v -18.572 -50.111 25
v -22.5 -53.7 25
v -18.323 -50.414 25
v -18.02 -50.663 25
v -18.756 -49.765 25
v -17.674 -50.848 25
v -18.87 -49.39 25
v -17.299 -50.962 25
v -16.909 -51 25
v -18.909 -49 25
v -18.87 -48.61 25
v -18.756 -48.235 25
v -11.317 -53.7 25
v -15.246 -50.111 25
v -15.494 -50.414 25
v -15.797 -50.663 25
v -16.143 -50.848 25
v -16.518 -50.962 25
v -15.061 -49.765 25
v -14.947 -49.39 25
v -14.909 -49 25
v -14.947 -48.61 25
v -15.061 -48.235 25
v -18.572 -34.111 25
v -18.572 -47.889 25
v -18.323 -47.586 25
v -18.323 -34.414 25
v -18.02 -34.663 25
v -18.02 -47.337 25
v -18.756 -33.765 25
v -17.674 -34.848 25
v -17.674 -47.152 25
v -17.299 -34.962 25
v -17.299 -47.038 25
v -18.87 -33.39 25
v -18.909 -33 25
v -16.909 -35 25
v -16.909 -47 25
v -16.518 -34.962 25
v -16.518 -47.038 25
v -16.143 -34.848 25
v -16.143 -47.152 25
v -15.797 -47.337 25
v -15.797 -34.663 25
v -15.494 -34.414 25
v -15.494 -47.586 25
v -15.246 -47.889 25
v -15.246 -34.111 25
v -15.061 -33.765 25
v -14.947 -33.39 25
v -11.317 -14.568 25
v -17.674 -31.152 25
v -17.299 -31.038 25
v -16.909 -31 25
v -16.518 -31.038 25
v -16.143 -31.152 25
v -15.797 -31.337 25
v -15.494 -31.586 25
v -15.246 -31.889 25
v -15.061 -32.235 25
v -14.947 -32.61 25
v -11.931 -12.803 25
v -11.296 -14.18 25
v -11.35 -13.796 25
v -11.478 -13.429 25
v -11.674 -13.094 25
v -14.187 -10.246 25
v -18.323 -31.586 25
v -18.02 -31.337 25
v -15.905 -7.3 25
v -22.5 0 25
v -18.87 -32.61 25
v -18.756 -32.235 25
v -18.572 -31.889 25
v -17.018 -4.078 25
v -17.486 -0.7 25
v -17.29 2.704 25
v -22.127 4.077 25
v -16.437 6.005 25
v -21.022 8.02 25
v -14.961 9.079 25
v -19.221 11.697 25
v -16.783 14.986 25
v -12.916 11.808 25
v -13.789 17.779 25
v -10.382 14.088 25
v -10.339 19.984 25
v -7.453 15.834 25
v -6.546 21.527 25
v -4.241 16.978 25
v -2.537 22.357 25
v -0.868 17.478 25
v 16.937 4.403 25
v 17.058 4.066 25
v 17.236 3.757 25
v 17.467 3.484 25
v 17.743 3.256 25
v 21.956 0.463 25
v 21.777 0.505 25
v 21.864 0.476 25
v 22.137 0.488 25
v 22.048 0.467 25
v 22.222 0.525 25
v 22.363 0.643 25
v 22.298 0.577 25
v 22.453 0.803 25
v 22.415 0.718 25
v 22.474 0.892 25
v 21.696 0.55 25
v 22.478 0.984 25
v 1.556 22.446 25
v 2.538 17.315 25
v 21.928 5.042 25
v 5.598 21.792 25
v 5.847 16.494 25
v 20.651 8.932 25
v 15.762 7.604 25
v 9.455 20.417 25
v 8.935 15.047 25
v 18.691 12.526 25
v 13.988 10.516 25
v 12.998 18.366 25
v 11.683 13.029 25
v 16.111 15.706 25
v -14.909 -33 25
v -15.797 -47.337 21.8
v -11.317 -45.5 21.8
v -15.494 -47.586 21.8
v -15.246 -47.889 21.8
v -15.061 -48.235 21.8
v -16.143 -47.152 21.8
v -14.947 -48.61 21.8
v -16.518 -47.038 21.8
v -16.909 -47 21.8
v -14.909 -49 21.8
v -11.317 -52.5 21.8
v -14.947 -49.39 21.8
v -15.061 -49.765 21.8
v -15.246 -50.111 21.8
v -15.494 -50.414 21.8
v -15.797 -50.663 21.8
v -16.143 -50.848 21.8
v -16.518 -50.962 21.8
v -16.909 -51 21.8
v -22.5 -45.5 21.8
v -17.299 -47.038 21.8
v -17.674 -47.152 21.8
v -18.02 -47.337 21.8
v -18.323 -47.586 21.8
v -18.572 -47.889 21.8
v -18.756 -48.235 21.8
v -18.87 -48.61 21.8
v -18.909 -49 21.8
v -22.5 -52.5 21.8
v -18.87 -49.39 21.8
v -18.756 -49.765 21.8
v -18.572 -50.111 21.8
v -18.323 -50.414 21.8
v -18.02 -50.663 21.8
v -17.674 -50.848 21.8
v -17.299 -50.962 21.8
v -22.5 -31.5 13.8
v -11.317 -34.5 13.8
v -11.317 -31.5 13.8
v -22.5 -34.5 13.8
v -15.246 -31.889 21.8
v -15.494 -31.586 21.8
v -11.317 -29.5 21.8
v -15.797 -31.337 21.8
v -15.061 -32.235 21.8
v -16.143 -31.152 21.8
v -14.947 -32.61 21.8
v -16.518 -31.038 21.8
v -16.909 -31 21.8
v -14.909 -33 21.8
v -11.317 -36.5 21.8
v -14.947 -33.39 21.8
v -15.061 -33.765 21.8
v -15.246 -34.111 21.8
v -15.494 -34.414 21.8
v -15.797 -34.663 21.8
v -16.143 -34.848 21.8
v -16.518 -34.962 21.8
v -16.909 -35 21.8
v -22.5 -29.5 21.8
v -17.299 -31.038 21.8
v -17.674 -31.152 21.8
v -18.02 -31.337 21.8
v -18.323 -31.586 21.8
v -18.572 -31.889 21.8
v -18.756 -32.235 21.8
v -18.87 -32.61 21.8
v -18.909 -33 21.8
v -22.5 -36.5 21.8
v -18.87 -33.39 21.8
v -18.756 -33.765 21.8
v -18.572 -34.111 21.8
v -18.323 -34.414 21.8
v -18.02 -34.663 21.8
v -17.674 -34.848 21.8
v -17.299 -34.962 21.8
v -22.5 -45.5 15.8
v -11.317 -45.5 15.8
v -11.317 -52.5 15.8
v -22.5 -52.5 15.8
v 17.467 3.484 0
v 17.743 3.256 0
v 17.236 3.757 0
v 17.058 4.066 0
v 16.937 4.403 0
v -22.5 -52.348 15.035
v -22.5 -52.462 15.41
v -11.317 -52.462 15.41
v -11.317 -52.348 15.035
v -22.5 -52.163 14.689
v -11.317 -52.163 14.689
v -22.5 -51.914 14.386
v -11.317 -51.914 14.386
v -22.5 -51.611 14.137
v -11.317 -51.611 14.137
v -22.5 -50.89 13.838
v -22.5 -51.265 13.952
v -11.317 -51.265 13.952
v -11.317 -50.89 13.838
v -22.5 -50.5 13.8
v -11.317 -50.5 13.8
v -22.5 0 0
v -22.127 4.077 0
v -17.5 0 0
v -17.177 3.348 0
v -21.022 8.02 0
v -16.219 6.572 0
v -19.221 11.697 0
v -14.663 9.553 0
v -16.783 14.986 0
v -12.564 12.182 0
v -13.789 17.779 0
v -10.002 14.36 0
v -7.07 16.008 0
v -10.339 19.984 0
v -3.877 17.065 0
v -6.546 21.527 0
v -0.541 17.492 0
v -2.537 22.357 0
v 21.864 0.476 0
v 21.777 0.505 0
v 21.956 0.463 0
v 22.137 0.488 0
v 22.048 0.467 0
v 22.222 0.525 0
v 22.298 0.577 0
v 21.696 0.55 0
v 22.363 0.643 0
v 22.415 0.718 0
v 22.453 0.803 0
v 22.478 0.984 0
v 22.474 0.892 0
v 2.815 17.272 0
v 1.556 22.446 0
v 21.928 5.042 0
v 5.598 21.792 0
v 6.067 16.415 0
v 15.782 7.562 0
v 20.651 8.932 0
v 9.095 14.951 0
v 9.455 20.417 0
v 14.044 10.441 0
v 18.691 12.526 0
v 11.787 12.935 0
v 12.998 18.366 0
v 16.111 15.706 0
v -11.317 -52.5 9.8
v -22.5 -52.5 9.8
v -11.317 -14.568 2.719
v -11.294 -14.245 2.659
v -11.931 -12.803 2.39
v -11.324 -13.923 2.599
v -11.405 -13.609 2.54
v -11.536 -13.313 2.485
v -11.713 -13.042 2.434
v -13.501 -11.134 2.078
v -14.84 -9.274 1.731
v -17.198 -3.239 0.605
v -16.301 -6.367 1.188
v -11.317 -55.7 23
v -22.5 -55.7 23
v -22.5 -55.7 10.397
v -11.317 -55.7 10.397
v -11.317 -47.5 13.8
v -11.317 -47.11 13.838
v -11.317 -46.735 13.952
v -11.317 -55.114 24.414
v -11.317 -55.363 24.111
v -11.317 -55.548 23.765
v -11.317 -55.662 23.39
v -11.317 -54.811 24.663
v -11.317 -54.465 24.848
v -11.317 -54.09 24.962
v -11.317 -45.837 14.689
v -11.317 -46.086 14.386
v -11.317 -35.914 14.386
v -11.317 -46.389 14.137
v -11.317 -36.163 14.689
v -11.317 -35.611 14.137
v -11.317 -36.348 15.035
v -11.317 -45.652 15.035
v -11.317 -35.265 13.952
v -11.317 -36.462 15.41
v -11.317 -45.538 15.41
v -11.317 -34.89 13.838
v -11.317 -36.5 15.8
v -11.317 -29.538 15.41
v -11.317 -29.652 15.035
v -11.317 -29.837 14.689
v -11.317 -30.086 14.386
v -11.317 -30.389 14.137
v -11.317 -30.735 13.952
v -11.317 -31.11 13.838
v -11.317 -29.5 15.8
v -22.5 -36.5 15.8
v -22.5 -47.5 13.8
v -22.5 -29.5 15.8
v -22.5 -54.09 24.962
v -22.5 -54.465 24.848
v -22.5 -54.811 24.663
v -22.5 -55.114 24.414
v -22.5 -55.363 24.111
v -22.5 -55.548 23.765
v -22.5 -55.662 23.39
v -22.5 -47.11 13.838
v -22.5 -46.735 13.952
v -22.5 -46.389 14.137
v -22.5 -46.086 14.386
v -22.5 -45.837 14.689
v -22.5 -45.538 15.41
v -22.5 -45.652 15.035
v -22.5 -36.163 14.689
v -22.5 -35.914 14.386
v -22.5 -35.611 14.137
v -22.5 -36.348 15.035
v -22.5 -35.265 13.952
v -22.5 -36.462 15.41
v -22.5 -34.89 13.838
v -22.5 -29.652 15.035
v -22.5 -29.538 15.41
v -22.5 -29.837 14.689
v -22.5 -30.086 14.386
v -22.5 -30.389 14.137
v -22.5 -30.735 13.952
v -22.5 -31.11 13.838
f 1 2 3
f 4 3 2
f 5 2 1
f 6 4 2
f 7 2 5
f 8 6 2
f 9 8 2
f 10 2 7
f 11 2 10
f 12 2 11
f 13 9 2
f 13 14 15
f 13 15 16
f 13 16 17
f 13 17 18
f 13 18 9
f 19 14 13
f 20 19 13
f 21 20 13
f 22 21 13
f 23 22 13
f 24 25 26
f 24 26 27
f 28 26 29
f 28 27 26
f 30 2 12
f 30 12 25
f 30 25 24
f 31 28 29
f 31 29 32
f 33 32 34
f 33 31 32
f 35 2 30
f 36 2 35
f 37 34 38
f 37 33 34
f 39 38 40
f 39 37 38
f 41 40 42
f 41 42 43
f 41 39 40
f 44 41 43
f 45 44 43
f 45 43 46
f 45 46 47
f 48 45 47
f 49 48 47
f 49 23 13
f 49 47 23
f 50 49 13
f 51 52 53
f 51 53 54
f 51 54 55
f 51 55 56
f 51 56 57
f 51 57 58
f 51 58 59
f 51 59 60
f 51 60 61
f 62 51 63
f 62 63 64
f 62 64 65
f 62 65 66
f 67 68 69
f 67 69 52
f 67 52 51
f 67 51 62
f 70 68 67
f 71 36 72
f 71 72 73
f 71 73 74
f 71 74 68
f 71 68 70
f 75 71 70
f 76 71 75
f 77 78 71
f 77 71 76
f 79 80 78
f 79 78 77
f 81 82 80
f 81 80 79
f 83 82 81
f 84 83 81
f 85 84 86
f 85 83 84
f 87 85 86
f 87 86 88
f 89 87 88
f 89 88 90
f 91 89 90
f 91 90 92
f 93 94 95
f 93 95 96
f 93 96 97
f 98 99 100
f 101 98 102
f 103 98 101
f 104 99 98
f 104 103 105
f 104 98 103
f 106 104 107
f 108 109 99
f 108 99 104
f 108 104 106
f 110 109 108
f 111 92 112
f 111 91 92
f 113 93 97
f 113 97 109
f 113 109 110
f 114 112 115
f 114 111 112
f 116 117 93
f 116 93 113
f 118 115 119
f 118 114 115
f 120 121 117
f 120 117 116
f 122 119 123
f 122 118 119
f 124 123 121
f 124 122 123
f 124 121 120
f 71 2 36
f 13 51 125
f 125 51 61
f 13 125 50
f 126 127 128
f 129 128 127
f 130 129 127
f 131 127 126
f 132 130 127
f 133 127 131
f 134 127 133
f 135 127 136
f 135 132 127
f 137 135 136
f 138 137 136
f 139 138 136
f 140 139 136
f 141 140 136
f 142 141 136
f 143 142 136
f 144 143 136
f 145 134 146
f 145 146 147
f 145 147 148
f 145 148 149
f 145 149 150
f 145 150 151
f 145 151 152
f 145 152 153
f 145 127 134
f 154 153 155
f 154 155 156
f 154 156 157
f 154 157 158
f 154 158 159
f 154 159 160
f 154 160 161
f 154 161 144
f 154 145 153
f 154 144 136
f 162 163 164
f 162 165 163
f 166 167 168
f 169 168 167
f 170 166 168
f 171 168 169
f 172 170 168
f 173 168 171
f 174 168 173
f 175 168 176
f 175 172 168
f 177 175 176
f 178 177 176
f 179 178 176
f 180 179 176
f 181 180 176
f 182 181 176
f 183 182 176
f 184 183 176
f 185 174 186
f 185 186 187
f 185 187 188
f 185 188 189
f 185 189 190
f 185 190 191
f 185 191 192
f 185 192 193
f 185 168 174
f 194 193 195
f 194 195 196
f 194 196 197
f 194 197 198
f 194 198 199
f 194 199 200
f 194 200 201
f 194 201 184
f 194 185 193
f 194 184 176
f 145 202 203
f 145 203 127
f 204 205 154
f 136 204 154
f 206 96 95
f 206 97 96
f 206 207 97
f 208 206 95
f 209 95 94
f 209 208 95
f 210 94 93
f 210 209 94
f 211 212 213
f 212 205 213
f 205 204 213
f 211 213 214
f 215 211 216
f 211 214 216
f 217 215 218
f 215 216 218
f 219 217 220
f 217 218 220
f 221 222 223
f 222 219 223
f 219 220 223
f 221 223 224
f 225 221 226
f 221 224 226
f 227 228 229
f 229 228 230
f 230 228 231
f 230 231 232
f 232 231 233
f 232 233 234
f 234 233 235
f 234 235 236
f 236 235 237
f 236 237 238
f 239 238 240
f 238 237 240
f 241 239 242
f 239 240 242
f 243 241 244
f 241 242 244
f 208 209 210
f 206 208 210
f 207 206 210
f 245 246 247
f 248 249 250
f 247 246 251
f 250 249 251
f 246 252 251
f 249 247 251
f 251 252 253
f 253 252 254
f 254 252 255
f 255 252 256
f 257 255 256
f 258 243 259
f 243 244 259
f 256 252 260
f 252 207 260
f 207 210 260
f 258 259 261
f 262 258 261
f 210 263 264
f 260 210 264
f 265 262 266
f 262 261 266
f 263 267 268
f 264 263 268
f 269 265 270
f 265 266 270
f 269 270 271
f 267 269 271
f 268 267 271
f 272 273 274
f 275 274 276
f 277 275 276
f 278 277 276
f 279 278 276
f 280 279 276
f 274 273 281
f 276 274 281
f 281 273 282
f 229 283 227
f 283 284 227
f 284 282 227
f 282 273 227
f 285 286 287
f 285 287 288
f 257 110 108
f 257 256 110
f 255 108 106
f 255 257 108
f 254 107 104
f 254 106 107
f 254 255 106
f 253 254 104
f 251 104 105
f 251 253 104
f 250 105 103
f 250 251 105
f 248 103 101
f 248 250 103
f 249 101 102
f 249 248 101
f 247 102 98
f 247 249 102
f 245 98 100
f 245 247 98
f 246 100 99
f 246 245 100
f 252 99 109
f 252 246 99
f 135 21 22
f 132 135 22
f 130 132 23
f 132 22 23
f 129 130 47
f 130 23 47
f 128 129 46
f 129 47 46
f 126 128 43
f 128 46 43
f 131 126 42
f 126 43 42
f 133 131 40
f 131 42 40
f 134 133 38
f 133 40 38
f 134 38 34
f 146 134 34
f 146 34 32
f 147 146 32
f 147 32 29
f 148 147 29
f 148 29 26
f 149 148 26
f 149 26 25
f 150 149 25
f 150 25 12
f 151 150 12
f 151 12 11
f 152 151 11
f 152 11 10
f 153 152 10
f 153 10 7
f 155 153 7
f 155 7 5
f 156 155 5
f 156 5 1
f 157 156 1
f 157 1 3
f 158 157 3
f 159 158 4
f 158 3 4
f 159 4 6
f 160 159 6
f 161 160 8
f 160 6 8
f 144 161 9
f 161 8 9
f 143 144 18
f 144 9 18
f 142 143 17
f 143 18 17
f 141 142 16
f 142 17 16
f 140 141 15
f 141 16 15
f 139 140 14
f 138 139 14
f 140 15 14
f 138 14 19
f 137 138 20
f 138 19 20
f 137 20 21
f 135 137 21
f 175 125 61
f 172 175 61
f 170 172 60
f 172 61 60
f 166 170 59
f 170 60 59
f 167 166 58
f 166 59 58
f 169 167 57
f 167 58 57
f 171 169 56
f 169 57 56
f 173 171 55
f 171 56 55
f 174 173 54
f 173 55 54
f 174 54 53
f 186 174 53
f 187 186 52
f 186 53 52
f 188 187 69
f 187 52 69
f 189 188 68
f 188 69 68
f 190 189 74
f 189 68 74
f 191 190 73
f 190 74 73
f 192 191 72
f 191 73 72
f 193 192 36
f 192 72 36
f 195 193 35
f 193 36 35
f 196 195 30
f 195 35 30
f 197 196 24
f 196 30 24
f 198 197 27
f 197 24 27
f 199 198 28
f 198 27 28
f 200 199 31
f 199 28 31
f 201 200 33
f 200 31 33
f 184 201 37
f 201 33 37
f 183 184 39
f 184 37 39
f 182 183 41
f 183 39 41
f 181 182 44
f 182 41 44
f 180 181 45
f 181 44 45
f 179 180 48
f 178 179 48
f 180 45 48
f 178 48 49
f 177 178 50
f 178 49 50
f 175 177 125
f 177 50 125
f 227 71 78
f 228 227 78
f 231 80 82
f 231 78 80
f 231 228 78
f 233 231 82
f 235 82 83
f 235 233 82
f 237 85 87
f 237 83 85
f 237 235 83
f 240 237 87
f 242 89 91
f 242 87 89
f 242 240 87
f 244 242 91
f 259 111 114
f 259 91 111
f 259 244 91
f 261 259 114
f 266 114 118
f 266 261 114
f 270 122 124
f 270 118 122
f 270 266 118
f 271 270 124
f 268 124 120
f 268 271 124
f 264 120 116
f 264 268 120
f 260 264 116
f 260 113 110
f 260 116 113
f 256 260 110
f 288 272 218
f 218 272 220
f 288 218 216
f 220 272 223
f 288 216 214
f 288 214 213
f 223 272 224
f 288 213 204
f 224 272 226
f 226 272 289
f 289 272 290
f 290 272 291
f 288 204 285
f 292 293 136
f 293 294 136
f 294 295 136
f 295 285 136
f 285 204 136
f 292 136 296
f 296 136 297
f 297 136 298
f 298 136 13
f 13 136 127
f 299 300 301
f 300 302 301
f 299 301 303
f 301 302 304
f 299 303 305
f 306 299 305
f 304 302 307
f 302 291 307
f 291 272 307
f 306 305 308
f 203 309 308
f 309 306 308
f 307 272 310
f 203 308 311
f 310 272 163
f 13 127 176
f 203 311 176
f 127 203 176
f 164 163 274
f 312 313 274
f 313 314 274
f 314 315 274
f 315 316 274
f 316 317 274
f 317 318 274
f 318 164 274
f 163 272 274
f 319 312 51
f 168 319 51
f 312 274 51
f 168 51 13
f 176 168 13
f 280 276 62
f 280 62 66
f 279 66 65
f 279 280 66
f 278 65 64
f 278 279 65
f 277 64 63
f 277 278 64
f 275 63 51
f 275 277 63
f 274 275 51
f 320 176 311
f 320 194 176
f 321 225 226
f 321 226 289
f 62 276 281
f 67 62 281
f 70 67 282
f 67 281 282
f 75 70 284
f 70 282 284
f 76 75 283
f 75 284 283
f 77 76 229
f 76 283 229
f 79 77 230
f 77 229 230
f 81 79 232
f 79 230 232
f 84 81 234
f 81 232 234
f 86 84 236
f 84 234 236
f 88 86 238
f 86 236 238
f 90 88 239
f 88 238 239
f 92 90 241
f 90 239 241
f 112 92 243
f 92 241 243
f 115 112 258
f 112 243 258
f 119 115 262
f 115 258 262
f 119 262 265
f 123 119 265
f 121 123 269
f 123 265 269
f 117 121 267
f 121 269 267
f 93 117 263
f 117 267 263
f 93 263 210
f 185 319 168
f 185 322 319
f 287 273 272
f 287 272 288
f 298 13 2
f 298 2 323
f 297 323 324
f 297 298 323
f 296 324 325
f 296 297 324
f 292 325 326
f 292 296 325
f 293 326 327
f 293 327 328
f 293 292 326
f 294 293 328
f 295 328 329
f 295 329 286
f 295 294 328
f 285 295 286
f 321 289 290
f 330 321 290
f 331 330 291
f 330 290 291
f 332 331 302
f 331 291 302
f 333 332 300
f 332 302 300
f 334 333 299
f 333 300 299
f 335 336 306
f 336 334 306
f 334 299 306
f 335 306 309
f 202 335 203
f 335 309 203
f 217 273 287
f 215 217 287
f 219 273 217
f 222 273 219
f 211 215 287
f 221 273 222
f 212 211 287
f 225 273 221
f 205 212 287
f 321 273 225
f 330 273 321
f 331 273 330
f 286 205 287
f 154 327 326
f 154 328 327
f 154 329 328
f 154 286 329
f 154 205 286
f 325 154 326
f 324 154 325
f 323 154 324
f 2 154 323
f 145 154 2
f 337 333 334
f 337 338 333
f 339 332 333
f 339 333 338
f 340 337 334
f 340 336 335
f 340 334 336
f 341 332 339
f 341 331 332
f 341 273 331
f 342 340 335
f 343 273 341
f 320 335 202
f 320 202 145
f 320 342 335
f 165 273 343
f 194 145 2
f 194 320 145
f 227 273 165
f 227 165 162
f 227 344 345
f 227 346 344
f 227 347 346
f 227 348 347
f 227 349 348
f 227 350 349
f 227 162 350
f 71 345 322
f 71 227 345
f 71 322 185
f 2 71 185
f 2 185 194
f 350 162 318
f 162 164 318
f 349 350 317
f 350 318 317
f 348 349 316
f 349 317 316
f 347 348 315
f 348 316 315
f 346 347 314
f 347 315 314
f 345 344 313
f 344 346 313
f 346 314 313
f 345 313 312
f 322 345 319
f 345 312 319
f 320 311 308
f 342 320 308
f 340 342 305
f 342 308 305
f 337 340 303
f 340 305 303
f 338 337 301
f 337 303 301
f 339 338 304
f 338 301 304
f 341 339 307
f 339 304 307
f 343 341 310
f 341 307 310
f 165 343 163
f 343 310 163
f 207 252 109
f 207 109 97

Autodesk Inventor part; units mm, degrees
ref_plane "YZ Plane" through (0, 0, 0) normal (1, 0, 0) x (0, 1, 0)
ref_plane "XZ Plane" through (0, 0, 0) normal (0, 1, 0) x (-1, 0, 0)
ref_plane "XY Plane" through (0, 0, 0) normal (0, 0, 1) x (1, 0, 0)
sketch "Эскиз1" plane through (0, 0, 0) normal (0, 0, 1) x (1, 0, 0)
  arc A0 (16.937, 4.4032) -> (-11.9308, -12.8026) centre (0, 0) ccw
  arc A1 (22.4785, 0.9844) -> (-22.5, 0) centre (0, 0) ccw
  line L0 (-22.5, 0) -> (-22.5, -55)
  line L1 (-22.5, 0) -> (32.5, 0) construction
  line L2 (-22.5, -55) -> (-17.5, -55)
  line L3 (21.6965, 0.5499) -> (17.743, 3.256)
  arc A2 (-11.3173, -14.5681) -> (-11.9308, -12.8026) centre (-13.2943, -14.2658) ccw
  arc A3 (16.937, 4.4032) -> (17.743, 3.256) centre (18.8727, 4.9064) ccw
  arc A4 (21.6965, 0.5499) -> (22.4785, 0.9844) centre (21.9789, 0.9626) ccw
  line L4 (-11.3173, -14.5681) -> (-11.3173, -55)
  line L5 (-11.3173, -55) -> (-17.5, -55)
  point P0 (22.5, 0)
  point P1 (-11.1519, -13.4865)
  point P2 (17.1061, 3.6919)
  dimension "d0" = 35
  dimension "d1" = 45
  dimension "d2" = 55
  dimension "d3" = 90
  dimension "d4" = 5
  dimension "d5" = 2
  dimension "d6" = 0.5
extrude "Выдавливание1" add sketch "Эскиз1" along normal blind 25
sketch "Эскиз2" plane through (0, 0, 25) normal (0, 0, 1) x (1, 0, 0)
  line L0 (-22.5, -55) -> (-11.3173, -55) projected
  line L1 (-16.9086, -55) -> (-16.9086, -49)
  circle A0 centre (-16.9086, -49) radius 2
  line L2 (-16.9086, -49) -> (-16.9086, -33)
  circle A1 centre (-16.9086, -33) radius 2
  point P0 (0, 0)
  dimension "d9" = 6
  dimension "d10" = 4
  dimension "d11" = 16
  dimension "d12" = 4
extrude "Выдавливание2" cut sketch "Эскиз2" against normal blind 10
sketch "Эскиз3" plane through (-22.5, -55, 0) normal (-1, 0, 0) x (0, 0, 1)
  line L0 (25, 24) -> (25, 20) projected
  line L1 (25, 8) -> (25, 4) projected
  line L2 (25, 20) -> (25, 18.5)
  line L3 (25, 8) -> (25, 11)
  line L4 (0, 55) -> (0, 0) projected
  line L5 (25, 18.5) -> (0, 18.5)
  line L6 (0, 18.5) -> (0, 9.5)
  line L7 (0, 9.5) -> (25, 9.5)
  line L8 (25, 9.5) -> (25, 18.5)
  line L9 (21.8, 18.5) -> (21.8, 9.5)
  line L10 (21.8, 18.5) -> (13.8, 18.5)
  line L11 (13.8, 18.5) -> (13.8, 9.5)
  line L12 (21.8, 9.5) -> (13.8, 9.5)
  line L13 (25, 24) -> (25, 25.5)
  line L14 (21.8, 18.5) -> (13.8, 18.5)
  line L15 (25, 24) -> (25, 4)
  line L16 (25, 14) -> (-3.5354, 14)
  line L17 (21.8, 9.5) -> (13.8, 9.5)
  line L18 (25, 4) -> (25, 2.5)
  line L19 (25, 20) -> (15, 20) projected
  line L20 (21.8, 20) -> (13.8, 20)
  line L21 (13.8, 20) -> (13.8, 25.5)
  line L22 (13.8, 25.5) -> (21.8, 25.5)
  line L23 (21.8, 25.5) -> (21.8, 20)
  line L24 (21.8, 8) -> (13.8, 8)
  line L25 (13.8, 8) -> (13.8, 2.5)
  line L26 (13.8, 2.5) -> (21.8, 2.5)
  line L27 (21.8, 2.5) -> (21.8, 8)
  line L28 (21.8, 18.5) -> (13.8, 18.5)
  line L29 (13.8, 18.5) -> (13.8, 20)
  line L30 (13.8, 20) -> (21.8, 20)
  line L31 (21.8, 20) -> (21.8, 18.5)
  line L32 (21.8, 8) -> (13.8, 8)
  line L33 (13.8, 8) -> (13.8, 9.5)
  line L34 (13.8, 9.5) -> (21.8, 9.5)
  line L35 (21.8, 9.5) -> (21.8, 8)
  point P0 (15, 8)
  point P1 (21.8, 9.5)
  point P2 (13.8, 9.5)
  dimension "d15" = 1.5
  dimension "d16" = 3
  dimension "d18" = 8
  dimension "d21" = 1.5
extrude "Выдавливание3" cut sketch "Эскиз3" against normal through all contours L31 L5 L29 L20 L19 | L19 L20 L21 L22 L23 | L35 L24 L33 L7 | L27 L26 L25 L24
sketch "Эскиз4" plane through (-22.5, -55, 0) normal (0, -1, 0) x (1, 0, 0)
  line L0 (0, 0) -> (11.1827, 0) projected
  line L1 (11.1827, 0) -> (11.1827, 25) projected
  line L2 (0, 25) -> (11.1827, 25) projected
  line L3 (0, 0) -> (0, 25) projected
  point P0 (22.5, 0)
extrude "Выдавливание4" add sketch "Эскиз4" along normal blind 0.7
sketch "Эскиз5" plane through (-22.5, 0, 0) normal (-1, 0, 0) x (0, 0, 1)
  line L0 (13.8, -52.5) -> (21.8, -52.5) projected
  line L1 (0, 0) -> (0, -55.7) projected
  line L2 (9.8, -52.5) -> (0, 0)
  line L3 (25, -55.7) -> (0, -55.7) projected
  line L4 (9.8, -52.5) -> (10.3973, -55.7)
  dimension "d24" = 4
extrude "Выдавливание5" cut sketch "Эскиз5" against normal through all
fillet "Сопряжение1" radius 2 4 edges at (-16.9086, -36.5, 13.8) (-16.9086, -29.5, 13.8) (-16.9086, -52.5, 13.8) (-16.9086, -45.5, 13.8)
fillet "Сопряжение2" radius 2 1 edges at (-16.9086, -55.7, 25)
properties part number "крюк"
